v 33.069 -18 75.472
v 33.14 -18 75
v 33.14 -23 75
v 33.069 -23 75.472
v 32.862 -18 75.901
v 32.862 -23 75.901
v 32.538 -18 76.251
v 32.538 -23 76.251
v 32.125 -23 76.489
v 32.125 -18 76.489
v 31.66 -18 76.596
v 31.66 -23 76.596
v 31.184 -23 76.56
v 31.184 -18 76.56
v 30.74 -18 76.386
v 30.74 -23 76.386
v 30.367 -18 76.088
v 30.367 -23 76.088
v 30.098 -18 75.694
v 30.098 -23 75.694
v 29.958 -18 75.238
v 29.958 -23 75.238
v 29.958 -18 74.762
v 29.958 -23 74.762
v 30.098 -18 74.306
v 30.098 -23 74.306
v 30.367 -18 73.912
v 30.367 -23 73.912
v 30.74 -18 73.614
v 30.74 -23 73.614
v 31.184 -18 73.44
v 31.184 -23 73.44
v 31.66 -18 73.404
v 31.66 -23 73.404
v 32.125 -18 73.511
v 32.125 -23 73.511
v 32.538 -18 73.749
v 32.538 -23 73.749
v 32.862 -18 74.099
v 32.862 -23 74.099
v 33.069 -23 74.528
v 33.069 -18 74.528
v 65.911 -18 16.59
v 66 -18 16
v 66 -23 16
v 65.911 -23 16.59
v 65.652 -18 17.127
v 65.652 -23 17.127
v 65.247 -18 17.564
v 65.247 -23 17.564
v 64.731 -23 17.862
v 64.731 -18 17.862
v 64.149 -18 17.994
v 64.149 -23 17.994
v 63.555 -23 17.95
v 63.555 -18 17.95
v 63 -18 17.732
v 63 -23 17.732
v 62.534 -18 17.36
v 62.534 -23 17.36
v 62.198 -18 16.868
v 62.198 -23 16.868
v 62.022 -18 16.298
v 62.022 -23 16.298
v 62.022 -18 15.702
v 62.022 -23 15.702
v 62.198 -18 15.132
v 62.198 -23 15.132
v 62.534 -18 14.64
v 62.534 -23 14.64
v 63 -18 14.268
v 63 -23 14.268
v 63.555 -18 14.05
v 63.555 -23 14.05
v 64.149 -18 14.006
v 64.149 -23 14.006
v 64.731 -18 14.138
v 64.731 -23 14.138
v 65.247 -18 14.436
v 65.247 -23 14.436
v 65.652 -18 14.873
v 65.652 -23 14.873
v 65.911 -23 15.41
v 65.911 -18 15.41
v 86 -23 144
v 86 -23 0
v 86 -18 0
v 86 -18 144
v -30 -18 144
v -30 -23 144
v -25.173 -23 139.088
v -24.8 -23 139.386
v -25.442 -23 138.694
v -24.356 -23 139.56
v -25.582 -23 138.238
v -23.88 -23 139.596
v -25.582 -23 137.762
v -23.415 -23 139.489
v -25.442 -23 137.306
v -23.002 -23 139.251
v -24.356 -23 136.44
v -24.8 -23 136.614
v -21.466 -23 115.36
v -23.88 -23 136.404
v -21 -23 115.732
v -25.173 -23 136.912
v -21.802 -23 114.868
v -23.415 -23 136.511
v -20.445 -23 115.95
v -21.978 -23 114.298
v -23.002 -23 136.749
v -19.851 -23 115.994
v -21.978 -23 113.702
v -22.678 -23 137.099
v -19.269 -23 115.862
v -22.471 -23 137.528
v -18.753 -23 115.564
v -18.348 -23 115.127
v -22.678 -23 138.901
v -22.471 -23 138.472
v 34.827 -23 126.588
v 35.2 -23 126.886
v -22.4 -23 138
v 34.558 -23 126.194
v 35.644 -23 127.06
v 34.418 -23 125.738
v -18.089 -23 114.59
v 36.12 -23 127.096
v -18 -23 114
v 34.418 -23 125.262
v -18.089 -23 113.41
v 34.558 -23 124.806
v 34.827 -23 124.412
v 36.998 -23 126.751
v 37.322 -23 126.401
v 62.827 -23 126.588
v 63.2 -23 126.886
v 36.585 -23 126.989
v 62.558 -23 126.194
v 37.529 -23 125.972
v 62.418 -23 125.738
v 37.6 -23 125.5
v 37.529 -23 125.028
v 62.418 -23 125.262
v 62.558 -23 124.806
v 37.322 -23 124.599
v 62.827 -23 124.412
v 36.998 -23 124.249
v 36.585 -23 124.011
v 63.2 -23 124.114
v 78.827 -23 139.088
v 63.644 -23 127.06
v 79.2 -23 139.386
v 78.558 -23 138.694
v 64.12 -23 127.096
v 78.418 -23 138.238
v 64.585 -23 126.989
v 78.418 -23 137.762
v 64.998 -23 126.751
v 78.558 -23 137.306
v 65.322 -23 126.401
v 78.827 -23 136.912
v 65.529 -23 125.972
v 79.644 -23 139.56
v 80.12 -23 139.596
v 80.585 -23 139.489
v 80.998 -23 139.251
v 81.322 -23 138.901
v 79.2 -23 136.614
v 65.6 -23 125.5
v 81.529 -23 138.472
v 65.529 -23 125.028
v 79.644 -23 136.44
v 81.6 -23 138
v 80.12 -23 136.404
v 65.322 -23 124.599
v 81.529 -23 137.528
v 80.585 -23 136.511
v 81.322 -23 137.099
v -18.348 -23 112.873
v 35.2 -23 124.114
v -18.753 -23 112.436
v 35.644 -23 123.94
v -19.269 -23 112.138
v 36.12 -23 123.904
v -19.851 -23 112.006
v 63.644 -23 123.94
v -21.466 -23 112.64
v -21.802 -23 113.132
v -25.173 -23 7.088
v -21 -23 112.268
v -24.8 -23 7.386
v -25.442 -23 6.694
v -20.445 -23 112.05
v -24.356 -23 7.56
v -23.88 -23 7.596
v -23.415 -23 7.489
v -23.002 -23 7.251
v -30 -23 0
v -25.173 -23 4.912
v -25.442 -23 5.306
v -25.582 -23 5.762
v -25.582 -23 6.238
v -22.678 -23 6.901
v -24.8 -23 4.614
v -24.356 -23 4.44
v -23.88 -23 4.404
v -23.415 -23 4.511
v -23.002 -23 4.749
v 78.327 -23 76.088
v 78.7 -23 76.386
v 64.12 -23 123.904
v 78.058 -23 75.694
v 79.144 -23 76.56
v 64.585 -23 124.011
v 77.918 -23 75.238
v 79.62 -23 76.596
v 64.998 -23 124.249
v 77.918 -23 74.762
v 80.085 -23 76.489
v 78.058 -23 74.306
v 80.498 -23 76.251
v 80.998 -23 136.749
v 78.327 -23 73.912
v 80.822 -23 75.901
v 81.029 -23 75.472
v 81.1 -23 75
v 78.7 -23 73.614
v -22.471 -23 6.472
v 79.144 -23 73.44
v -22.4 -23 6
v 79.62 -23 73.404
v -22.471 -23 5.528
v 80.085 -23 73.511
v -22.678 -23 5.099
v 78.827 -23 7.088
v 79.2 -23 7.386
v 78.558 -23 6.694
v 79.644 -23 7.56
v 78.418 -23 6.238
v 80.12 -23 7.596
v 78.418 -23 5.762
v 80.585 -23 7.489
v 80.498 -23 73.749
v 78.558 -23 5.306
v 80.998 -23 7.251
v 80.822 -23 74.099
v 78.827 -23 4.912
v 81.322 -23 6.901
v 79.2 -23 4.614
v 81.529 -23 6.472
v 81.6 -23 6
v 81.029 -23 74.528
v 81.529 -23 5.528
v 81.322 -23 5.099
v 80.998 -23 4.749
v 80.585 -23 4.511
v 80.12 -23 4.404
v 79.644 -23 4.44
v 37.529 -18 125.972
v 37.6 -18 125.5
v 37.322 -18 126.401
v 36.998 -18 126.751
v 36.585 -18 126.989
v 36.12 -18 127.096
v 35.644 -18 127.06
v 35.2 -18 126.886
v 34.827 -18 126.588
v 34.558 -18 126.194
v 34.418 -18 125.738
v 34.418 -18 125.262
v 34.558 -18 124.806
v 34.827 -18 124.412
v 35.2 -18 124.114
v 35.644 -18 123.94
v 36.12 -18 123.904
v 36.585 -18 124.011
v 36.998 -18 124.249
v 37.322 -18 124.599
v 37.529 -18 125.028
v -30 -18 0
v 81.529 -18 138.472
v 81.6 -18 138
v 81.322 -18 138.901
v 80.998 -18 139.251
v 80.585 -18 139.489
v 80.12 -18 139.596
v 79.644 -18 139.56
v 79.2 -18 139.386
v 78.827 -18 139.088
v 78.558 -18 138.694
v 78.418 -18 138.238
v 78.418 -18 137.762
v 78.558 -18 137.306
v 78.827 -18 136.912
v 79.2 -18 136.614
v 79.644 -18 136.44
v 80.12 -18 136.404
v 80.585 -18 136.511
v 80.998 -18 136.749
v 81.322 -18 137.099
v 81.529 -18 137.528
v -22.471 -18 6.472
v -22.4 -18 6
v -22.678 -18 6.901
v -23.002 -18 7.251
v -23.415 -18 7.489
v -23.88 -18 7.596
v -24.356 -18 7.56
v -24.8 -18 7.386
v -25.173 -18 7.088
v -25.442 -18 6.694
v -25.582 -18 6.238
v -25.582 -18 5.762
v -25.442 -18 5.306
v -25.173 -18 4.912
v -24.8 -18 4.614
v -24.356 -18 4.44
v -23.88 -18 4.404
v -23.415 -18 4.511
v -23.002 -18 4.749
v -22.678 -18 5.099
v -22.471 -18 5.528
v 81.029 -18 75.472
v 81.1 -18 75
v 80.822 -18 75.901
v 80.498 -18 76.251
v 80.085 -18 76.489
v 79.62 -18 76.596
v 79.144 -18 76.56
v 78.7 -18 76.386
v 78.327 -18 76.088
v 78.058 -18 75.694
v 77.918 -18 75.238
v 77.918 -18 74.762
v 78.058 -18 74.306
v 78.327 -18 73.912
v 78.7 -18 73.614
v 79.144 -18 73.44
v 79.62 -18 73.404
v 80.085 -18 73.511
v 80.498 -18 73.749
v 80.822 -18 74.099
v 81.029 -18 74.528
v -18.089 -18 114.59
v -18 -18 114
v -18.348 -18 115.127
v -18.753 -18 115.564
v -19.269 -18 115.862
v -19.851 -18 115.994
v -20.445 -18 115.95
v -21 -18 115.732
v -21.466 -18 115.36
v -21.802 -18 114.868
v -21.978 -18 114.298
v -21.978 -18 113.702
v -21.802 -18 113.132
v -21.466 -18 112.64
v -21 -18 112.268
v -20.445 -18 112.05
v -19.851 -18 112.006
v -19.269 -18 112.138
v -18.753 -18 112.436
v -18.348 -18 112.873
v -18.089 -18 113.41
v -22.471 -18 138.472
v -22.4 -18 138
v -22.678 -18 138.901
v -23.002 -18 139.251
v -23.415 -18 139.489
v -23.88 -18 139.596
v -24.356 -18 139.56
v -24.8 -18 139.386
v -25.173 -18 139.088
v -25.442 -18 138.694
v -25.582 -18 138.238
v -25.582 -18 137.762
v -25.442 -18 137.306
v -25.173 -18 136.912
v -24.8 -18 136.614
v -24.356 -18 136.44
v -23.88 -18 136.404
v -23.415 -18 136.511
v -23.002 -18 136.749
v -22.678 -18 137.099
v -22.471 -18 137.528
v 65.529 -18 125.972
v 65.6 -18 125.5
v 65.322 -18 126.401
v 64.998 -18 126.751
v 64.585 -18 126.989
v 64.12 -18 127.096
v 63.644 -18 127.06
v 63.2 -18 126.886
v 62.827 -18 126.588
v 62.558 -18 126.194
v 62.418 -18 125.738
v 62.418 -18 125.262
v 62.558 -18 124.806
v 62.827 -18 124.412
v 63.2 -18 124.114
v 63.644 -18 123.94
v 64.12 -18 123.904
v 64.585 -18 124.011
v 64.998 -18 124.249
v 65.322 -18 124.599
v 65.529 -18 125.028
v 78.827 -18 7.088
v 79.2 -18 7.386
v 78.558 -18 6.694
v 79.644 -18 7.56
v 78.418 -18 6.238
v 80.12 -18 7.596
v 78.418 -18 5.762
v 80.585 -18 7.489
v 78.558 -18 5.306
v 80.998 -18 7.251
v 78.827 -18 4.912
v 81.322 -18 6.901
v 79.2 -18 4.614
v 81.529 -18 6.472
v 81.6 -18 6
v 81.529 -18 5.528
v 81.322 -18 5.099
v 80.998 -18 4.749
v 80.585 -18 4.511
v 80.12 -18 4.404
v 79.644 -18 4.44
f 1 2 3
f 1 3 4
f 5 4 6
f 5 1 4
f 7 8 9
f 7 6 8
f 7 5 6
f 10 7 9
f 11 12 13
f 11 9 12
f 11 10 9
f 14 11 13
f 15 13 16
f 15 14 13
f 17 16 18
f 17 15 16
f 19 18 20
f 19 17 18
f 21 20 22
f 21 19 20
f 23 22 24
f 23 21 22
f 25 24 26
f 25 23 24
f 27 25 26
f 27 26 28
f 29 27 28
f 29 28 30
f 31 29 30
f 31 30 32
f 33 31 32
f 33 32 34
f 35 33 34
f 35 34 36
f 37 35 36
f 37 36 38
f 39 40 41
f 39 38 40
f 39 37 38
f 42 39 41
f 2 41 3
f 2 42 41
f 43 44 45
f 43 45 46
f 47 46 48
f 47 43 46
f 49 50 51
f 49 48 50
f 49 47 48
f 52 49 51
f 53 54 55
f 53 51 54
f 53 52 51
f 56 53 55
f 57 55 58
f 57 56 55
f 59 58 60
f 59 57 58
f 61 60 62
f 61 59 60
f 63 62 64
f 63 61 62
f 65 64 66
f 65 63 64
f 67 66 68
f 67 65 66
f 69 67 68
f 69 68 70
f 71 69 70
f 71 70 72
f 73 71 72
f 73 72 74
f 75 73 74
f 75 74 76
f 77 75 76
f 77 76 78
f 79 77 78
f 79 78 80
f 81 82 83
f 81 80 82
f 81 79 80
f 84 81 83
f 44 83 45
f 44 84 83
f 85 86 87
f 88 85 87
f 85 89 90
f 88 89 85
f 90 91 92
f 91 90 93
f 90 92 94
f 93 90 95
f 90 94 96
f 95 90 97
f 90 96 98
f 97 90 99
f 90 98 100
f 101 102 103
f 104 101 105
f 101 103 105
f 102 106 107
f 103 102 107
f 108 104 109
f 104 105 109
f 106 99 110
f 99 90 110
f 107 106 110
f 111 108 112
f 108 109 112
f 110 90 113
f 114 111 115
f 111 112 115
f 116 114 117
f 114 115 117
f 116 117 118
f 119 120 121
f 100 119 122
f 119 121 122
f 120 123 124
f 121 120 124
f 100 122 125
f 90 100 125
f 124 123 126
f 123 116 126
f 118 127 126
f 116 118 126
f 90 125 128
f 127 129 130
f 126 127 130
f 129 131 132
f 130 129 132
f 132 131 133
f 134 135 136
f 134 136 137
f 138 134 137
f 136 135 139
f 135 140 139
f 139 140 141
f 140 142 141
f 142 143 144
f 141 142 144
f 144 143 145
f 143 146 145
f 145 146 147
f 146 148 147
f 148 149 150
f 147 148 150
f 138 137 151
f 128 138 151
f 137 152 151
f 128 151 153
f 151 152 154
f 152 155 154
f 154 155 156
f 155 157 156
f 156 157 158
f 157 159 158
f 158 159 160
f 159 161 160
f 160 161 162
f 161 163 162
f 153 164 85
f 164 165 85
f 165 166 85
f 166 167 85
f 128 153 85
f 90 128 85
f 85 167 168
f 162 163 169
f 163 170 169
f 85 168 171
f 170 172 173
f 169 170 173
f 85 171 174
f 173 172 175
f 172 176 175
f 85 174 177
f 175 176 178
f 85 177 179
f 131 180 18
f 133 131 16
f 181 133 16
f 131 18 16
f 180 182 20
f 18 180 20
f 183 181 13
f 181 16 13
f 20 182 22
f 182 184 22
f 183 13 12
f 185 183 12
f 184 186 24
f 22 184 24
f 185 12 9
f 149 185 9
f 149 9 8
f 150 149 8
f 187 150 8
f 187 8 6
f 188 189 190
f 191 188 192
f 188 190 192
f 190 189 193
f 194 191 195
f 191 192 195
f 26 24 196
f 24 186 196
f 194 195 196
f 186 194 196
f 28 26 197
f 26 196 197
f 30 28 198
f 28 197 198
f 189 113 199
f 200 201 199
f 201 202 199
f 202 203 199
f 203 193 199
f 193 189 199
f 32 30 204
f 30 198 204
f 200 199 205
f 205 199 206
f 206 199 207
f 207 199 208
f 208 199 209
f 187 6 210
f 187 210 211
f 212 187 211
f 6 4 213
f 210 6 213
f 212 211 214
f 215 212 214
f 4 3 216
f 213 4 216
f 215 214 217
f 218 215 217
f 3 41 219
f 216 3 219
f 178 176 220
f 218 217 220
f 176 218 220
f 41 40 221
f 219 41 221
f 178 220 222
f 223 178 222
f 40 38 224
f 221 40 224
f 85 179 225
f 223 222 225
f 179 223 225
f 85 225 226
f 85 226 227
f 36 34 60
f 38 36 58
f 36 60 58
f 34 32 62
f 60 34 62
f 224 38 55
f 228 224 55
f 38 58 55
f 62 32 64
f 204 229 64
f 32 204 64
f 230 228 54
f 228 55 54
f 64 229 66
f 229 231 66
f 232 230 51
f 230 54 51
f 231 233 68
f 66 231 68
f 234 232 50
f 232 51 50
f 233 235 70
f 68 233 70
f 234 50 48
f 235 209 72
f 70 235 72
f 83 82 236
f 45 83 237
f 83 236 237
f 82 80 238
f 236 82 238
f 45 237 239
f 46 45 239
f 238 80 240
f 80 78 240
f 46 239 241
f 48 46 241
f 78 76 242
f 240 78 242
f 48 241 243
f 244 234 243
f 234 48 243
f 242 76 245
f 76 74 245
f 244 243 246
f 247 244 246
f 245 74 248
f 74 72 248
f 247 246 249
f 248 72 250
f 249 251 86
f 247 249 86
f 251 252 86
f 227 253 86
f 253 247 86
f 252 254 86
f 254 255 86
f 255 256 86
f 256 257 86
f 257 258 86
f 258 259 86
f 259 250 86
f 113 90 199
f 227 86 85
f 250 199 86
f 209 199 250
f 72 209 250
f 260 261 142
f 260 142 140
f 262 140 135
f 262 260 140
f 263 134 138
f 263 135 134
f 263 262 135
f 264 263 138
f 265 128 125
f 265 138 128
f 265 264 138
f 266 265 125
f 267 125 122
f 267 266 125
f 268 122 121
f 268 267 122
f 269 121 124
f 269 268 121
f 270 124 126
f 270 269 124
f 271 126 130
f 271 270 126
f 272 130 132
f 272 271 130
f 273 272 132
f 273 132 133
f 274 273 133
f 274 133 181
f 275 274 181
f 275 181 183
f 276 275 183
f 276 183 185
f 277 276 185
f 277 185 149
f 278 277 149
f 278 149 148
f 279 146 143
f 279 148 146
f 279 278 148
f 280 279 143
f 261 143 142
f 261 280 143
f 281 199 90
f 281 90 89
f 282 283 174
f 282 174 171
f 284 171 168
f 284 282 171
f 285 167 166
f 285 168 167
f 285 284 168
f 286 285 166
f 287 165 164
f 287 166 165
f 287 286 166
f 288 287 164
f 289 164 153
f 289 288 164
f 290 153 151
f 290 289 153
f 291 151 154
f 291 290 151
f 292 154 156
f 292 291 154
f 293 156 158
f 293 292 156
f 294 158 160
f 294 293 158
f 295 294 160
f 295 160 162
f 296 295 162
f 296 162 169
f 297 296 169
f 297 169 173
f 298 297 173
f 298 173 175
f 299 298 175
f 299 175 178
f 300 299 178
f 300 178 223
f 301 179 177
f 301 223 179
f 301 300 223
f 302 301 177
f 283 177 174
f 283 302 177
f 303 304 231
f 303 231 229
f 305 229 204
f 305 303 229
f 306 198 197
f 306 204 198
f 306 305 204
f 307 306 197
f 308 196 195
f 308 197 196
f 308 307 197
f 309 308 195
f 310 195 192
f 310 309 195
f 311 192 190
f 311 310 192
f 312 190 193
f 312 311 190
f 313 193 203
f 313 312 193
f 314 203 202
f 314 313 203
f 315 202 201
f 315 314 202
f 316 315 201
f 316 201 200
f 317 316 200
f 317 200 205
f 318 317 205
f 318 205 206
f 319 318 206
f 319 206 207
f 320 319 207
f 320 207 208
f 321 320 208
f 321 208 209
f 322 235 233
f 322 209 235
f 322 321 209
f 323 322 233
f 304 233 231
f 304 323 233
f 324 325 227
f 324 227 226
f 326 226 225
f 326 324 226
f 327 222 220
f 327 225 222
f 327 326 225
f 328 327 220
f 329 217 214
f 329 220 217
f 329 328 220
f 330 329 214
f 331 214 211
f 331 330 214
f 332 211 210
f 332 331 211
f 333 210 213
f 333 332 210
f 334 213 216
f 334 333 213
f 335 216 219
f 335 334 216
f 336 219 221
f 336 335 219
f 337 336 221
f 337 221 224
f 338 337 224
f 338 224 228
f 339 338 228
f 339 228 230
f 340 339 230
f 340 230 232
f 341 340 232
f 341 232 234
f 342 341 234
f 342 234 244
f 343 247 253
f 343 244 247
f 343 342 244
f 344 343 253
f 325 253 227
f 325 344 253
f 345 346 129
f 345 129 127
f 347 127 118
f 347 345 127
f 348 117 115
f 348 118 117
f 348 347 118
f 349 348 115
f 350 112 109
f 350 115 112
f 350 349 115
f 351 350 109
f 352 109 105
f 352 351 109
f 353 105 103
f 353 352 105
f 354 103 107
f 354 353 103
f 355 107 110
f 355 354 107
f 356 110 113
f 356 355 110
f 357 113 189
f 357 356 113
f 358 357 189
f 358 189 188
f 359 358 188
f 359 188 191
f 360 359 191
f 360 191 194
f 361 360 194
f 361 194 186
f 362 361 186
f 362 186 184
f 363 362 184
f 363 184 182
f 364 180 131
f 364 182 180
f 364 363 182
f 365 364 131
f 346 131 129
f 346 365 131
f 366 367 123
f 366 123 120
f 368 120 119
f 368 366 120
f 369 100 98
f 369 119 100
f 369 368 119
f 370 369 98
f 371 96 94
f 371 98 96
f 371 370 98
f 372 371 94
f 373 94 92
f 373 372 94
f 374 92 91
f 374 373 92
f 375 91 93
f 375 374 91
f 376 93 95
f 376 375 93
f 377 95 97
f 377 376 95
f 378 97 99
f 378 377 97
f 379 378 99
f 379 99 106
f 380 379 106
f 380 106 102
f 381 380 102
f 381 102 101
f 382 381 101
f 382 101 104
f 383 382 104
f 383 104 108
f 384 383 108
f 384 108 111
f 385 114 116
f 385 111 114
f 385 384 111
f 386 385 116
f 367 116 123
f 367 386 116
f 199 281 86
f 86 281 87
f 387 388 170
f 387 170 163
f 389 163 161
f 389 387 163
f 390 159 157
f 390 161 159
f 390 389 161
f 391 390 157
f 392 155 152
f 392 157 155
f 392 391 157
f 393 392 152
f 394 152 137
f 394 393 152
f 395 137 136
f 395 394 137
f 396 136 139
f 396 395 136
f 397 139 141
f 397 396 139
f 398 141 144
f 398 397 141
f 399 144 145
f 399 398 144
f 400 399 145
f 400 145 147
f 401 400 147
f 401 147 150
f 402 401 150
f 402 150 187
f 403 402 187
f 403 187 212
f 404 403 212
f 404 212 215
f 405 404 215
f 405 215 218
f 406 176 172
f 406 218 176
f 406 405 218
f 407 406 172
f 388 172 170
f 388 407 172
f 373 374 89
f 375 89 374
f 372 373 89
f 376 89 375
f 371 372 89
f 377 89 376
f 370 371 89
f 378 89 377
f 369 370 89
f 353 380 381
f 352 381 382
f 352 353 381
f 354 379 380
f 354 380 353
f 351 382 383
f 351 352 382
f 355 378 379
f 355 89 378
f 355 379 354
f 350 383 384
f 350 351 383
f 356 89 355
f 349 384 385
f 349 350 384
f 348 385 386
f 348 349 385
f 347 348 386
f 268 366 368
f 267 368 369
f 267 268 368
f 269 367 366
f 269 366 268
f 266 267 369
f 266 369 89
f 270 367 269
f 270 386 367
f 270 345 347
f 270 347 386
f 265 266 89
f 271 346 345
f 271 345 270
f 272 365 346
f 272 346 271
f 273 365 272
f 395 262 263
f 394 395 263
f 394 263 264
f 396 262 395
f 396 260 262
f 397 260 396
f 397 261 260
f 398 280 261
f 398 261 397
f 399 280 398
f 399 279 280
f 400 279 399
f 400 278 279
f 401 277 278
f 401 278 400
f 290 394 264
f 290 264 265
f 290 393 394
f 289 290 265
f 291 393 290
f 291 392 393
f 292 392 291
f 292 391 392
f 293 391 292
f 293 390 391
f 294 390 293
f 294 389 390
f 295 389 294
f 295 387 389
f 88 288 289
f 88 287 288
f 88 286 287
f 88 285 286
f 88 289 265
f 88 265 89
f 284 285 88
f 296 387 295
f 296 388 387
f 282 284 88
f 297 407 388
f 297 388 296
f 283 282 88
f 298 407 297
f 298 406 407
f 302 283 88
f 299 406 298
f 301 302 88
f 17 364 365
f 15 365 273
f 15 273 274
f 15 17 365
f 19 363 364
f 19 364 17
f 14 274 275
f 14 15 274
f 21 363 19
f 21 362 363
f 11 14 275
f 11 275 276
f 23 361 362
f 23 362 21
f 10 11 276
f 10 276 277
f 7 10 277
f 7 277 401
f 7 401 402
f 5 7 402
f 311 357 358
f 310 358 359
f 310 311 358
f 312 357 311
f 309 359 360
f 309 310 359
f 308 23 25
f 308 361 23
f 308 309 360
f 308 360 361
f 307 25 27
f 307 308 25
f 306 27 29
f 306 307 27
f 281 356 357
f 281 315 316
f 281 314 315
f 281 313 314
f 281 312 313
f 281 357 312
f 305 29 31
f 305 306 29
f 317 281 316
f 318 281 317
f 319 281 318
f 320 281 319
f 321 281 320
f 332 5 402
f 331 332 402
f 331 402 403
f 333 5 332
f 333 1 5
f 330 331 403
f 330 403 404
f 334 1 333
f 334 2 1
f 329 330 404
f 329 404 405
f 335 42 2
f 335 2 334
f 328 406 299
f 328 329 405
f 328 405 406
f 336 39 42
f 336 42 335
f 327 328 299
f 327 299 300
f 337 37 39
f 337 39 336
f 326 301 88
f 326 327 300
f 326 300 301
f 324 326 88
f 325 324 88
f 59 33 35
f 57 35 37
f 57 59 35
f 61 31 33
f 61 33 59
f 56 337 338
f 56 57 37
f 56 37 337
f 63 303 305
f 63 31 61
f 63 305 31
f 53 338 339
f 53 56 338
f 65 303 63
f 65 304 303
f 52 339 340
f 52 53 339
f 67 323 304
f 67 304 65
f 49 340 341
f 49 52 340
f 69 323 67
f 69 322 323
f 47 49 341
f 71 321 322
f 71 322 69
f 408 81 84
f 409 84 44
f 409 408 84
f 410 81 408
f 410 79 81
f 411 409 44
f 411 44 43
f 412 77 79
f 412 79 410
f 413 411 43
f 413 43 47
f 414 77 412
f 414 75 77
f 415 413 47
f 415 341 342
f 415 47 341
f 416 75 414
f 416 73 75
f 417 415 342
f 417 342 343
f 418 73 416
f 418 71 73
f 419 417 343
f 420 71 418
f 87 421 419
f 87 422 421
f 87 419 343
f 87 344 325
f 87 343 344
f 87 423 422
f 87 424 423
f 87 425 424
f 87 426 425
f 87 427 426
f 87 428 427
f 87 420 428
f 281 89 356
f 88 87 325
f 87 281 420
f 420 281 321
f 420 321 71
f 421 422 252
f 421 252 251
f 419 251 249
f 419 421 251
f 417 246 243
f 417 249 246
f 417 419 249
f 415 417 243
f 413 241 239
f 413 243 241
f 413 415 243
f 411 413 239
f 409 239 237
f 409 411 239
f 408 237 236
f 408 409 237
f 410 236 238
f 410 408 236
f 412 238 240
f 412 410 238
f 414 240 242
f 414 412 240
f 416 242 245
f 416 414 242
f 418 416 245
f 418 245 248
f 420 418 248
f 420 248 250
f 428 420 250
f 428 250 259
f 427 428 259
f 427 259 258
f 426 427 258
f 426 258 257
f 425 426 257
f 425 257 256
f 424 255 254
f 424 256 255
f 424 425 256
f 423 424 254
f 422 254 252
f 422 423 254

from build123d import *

# Parameters (mm, degrees)
CYLINDER096_R           = 2
CYLINDER096_DEPTH       = 10
CYLINDER096_ROLL_ANGLE  = 90
CYLINDER097_R           = 2
CYLINDER097_DEPTH       = 10
CYLINDER097_ROLL_ANGLE  = 90
CYLINDER026_R           = 1.6
CYLINDER026_DEPTH       = 50
CYLINDER026_ROLL_ANGLE  = 90
CYLINDER025_R           = 1.6
CYLINDER025_DEPTH       = 50
CYLINDER025_ROLL_ANGLE  = 90
CYLINDER028_R           = 1.6
CYLINDER028_DEPTH       = 50
CYLINDER028_ROLL_ANGLE  = 90
CYLINDER027_R           = 1.6
CYLINDER027_DEPTH       = 50
CYLINDER027_ROLL_ANGLE  = 90
CYLINDER019_R           = 1.6
CYLINDER019_DEPTH       = 40
CYLINDER019_PITCH_ANGLE = 90
CYLINDER018_R           = 1.6
CYLINDER018_DEPTH       = 40
CYLINDER018_PITCH_ANGLE = 90
CYLINDER017_R           = 1.6
CYLINDER017_DEPTH       = 40
CYLINDER016_R           = 1.6
CYLINDER016_DEPTH       = 70
CYLINDER016_ROLL_ANGLE  = 90
CYLINDER015_R           = 1.6
CYLINDER015_DEPTH       = 40
BOX011_W                = 116
BOX011_H                = 5
BOX011_DEPTH            = 144


with BuildPart() as cylinder373:
    # Cylinder096 → Cylinder096 (new body)
    with BuildSketch(Plane.XY):
        Circle(CYLINDER096_R)
    extrude(amount=CYLINDER096_DEPTH)


with BuildPart() as cylinder373_1:
    # Cylinder096 roll: moved
    add(cylinder373.part.rotate(Axis((0, 0, 0), (1, 0, 0)), CYLINDER096_ROLL_ANGLE))


with BuildPart() as cylinder373_2:
    # Cylinder096 placement: moved
    add(cylinder373_1.part.moved(Location((-20, -15, 114))))


with BuildPart() as cylinder374:
    # Cylinder097 → Cylinder097 (new body)
    with BuildSketch(Plane.XY):
        Circle(CYLINDER097_R)
    extrude(amount=CYLINDER097_DEPTH)


with BuildPart() as cylinder374_1:
    # Cylinder097 roll: moved
    add(cylinder374.part.rotate(Axis((0, 0, 0), (1, 0, 0)), CYLINDER097_ROLL_ANGLE))


with BuildPart() as cylinder374_2:
    # Cylinder097 placement: moved
    add(cylinder374_1.part.moved(Location((64, -15, 16))))


with BuildPart() as cylinder033:
    # Cylinder026 → Cylinder026 (new body)
    with BuildSketch(Plane.XY):
        Circle(CYLINDER026_R)
    extrude(amount=CYLINDER026_DEPTH)


with BuildPart() as cylinder033_1:
    # Cylinder026 roll: moved
    add(cylinder033.part.rotate(Axis((0, 0, 0), (1, 0, 0)), CYLINDER026_ROLL_ANGLE))


with BuildPart() as cylinder033_2:
    # Cylinder026 placement: moved
    add(cylinder033_1.part.moved(Location((26.54, 7, 54))))


with BuildPart() as fusion031:
    # Cylinder025 → Cylinder025 (new body)
    with BuildSketch(Plane.XY):
        Circle(CYLINDER025_R)
    extrude(amount=CYLINDER025_DEPTH)


with BuildPart() as fusion031_1:
    # Cylinder025 roll: moved
    add(fusion031.part.rotate(Axis((0, 0, 0), (1, 0, 0)), CYLINDER025_ROLL_ANGLE))


with BuildPart() as fusion031_2:
    # Cylinder025 placement: moved
    add(fusion031_1.part.moved(Location((74.5, 7, 54))))

    # Fusion031: union Cylinder033
    add(cylinder033_2.part)


with BuildPart() as fusion032:
    # Cylinder028 → Cylinder028 (new body)
    with BuildSketch(Plane.XY):
        Circle(CYLINDER028_R)
    extrude(amount=CYLINDER028_DEPTH)


with BuildPart() as fusion032_1:
    # Cylinder028 roll: moved
    add(fusion032.part.rotate(Axis((0, 0, 0), (1, 0, 0)), CYLINDER028_ROLL_ANGLE))


with BuildPart() as fusion032_2:
    # Cylinder028 placement: moved
    add(fusion032_1.part.moved(Location((31, 7, 104.5))))

    # Fusion032: union Fusion031
    add(fusion031_2.part)


with BuildPart() as arduino_holes:
    # Cylinder027 → Cylinder027 (new body)
    with BuildSketch(Plane.XY):
        Circle(CYLINDER027_R)
    extrude(amount=CYLINDER027_DEPTH)


with BuildPart() as arduino_holes_1:
    # Cylinder027 roll: moved
    add(arduino_holes.part.rotate(Axis((0, 0, 0), (1, 0, 0)), CYLINDER027_ROLL_ANGLE))


with BuildPart() as arduino_holes_2:
    # Cylinder027 placement: moved
    add(arduino_holes_1.part.moved(Location((59, 7, 104.5))))

    # Fusion033: union Fusion032
    add(fusion032_2.part)


with BuildPart() as arduino_holes_3:
    # Fusion033 placement: moved
    add(arduino_holes_2.part.moved(Location((5, 0, 21))))


with BuildPart() as cylinder100:
    # Cylinder019 → Cylinder019 (new body)
    with BuildSketch(Plane.XY):
        Circle(CYLINDER019_R)
    extrude(amount=CYLINDER019_DEPTH)


with BuildPart() as cylinder100_1:
    # Cylinder019 pitch: moved
    add(cylinder100.part.rotate(Axis((0, 0, 0), (0, 1, 0)), CYLINDER019_PITCH_ANGLE))


with BuildPart() as cylinder100_2:
    # Cylinder019 placement: moved
    add(cylinder100_1.part.moved(Location((-40, 12, 9.5))))


with BuildPart() as fusion011:
    # Cylinder018 → Cylinder018 (new body)
    with BuildSketch(Plane.XY):
        Circle(CYLINDER018_R)
    extrude(amount=CYLINDER018_DEPTH)


with BuildPart() as fusion011_1:
    # Cylinder018 pitch: moved
    add(fusion011.part.rotate(Axis((0, 0, 0), (0, 1, 0)), CYLINDER018_PITCH_ANGLE))


with BuildPart() as fusion011_2:
    # Cylinder018 placement: moved
    add(fusion011_1.part.moved(Location((-40, -7, 2.5))))

    # Fusion011: union Cylinder100
    add(cylinder100_2.part)


with BuildPart() as fusion012:
    # Cylinder017 → Cylinder017 (new body)
    with BuildSketch(Plane(origin=(-27.5, 7, -15), x_dir=(1, 0, 0), z_dir=(0, 0, 1))):
        Circle(CYLINDER017_R)
    extrude(amount=CYLINDER017_DEPTH)

    # Fusion012: union Fusion011
    add(fusion011_2.part)


with BuildPart() as fusion013:
    # Cylinder016 → Cylinder016 (new body)
    with BuildSketch(Plane.XY):
        Circle(CYLINDER016_R)
    extrude(amount=CYLINDER016_DEPTH)


with BuildPart() as fusion013_1:
    # Cylinder016 roll: moved
    add(fusion013.part.rotate(Axis((0, 0, 0), (1, 0, 0)), CYLINDER016_ROLL_ANGLE))


with BuildPart() as fusion013_2:
    # Cylinder016 placement: moved
    add(fusion013_1.part.moved(Location((-24, 39, 6))))

    # Fusion013: union Fusion012
    add(fusion012.part)


with BuildPart() as cylinder008:
    # Cylinder015 → Cylinder015 (new body)
    with BuildSketch(Plane(origin=(-20.5, -12, -15), x_dir=(1, 0, 0), z_dir=(0, 0, 1))):
        Circle(CYLINDER015_R)
    extrude(amount=CYLINDER015_DEPTH)


with BuildPart() as face_corner_holes015:
    # Fusion029 base: copy of Cylinder008
    add(cylinder008.part)

    # Fusion029: union Fusion013
    add(fusion013_2.part)


with BuildPart() as face_corner_holes015_1:
    # Fusion029 placement: moved
    add(face_corner_holes015.part.moved(Location((104, 0, 132))))


with BuildPart() as face_corner_holes011:
    # Fusion025 base: copy of Cylinder008
    add(cylinder008.part)

    # Fusion025: union Fusion013
    add(fusion013_2.part)


with BuildPart() as face_corner_holes011_1:
    # Fusion025 placement: moved
    add(face_corner_holes011.part.moved(Location((0, 0, 132))))


with BuildPart() as face_corner_holes007:
    # Fusion021 base: copy of Cylinder008
    add(cylinder008.part)

    # Fusion021: union Fusion013
    add(fusion013_2.part)


with BuildPart() as face_corner_holes007_1:
    # Fusion021 placement: moved
    add(face_corner_holes007.part.moved(Location((104, 0, 0))))


with BuildPart() as face_corner_holes004:
    # Fusion018 base: copy of Cylinder008
    add(cylinder008.part)

    # Fusion018: union Fusion013
    add(fusion013_2.part)


with BuildPart() as back_a:
    # Box011 → Box011 (new body)
    with BuildSketch(Plane(origin=(-30, -23, 0), x_dir=(1, 0, 0), z_dir=(0, 0, 1))):
        with Locations((58, 2.5)):
            Rectangle(BOX011_W, BOX011_H)
    extrude(amount=BOX011_DEPTH)

    # Cut013: cut face-corner-holes004
    add(face_corner_holes004.part, mode=Mode.SUBTRACT)

    # Cut017: cut face-corner-holes007
    add(face_corner_holes007_1.part, mode=Mode.SUBTRACT)

    # Cut022: cut face-corner-holes011
    add(face_corner_holes011_1.part, mode=Mode.SUBTRACT)

    # Cut027: cut face-corner-holes015
    add(face_corner_holes015_1.part, mode=Mode.SUBTRACT)

    # Cut028: cut arduino-holes
    add(arduino_holes_3.part, mode=Mode.SUBTRACT)

    # Cut057: cut Cylinder374
    add(cylinder374_2.part, mode=Mode.SUBTRACT)

    # Cut058: cut Cylinder373
    add(cylinder373_2.part, mode=Mode.SUBTRACT)


solid = back_a.part
